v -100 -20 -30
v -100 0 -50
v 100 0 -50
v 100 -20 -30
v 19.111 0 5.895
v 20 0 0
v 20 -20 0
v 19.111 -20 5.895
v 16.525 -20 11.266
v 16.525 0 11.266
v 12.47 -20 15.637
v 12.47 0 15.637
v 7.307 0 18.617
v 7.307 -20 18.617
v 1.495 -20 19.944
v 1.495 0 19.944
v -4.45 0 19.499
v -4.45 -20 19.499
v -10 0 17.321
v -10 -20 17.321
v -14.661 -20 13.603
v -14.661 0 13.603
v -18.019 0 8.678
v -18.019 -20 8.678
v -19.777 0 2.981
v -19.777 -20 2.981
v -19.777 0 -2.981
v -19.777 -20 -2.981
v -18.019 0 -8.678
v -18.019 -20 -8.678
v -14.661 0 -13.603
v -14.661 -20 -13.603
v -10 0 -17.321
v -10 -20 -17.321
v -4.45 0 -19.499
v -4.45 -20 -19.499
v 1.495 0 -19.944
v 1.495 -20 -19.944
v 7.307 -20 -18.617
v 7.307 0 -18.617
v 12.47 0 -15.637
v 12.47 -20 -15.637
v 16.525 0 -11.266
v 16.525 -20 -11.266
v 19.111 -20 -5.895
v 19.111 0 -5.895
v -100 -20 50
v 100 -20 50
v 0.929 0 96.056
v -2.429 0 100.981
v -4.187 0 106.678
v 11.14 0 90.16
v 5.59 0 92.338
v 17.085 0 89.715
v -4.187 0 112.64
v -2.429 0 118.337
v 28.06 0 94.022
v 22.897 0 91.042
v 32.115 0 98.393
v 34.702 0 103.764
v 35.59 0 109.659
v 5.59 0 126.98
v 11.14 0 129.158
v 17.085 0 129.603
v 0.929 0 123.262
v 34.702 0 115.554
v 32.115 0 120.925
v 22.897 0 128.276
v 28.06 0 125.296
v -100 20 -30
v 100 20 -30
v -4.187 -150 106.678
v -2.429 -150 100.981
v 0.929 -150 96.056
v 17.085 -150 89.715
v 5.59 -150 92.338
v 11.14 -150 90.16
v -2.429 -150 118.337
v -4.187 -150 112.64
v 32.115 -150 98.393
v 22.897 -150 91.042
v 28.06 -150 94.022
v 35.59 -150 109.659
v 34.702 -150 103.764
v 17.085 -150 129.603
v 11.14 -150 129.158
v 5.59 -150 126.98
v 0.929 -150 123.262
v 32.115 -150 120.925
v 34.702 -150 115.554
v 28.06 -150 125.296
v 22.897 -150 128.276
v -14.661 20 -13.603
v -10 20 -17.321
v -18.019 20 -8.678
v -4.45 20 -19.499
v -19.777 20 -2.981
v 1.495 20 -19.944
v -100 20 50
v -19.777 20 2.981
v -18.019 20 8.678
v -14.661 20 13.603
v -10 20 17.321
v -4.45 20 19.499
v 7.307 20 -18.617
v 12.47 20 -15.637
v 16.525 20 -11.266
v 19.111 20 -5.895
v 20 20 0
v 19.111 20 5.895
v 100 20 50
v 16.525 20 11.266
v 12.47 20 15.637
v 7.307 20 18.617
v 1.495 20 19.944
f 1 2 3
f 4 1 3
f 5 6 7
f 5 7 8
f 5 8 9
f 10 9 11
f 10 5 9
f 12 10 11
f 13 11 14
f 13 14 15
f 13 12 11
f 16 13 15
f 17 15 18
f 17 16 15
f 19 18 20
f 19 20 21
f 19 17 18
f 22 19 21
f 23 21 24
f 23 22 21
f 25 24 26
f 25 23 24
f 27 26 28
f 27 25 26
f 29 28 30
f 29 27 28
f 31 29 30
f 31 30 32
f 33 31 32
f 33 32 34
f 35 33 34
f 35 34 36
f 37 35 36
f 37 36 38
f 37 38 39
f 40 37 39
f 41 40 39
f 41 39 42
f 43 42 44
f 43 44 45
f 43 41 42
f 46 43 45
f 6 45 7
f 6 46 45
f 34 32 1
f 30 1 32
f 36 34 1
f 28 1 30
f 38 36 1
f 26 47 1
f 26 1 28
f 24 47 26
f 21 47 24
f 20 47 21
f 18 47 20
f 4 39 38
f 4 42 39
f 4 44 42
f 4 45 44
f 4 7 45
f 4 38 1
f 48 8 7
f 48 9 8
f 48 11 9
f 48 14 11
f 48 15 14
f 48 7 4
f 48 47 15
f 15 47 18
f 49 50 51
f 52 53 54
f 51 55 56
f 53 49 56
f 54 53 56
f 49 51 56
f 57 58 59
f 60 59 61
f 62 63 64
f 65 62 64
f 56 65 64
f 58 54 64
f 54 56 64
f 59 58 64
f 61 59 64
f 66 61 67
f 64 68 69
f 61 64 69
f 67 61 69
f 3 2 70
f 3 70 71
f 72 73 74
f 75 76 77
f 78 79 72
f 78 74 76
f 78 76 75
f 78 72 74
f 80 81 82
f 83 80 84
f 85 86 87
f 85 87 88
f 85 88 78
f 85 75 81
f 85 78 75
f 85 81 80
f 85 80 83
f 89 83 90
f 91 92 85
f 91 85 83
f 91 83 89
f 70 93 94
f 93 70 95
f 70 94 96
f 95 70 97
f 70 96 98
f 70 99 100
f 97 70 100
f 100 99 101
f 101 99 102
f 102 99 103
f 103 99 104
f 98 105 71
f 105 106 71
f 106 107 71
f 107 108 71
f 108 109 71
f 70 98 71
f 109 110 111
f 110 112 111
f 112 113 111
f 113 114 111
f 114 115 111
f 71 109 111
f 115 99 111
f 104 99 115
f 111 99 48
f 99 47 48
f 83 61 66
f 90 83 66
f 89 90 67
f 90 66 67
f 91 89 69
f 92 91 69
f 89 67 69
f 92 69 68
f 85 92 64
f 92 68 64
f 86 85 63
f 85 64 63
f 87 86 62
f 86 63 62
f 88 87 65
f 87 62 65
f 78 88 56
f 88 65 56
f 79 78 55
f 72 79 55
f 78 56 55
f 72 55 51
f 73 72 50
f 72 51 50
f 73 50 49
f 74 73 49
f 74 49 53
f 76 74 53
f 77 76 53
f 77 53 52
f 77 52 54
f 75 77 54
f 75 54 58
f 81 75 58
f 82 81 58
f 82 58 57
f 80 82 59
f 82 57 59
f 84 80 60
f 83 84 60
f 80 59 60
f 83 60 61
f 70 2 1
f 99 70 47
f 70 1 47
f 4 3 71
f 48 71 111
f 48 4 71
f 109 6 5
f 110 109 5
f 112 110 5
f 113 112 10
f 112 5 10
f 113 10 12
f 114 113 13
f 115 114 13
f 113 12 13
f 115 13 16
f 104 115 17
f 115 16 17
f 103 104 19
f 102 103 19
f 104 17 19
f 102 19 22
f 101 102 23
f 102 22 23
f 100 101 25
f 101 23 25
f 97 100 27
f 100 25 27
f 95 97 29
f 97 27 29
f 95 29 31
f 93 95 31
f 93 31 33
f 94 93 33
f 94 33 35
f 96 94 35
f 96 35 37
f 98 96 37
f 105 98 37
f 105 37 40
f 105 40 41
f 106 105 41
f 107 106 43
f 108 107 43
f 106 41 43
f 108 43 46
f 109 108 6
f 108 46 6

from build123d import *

# Parameters (mm, degrees)
F0_W          = 200
F0_H          = 100
F0_R          = 20
F1_DEPTH      = 20
F1_DEPTH_BACK = 20
F2_SIZE       = 19.99999
F3_R          = 20
F4_DEPTH      = 150


# Not quite as in the source:
# - a fillet or chamfer is up to 0.001 mm smaller than in the source, because OpenCascade refuses the exact size


with BuildPart() as f1:
    # F0 (on Front) → F1 (new body, two sides)
    with BuildSketch(Plane.XZ) as f1_sk:
        Rectangle(F0_W, F0_H)
        Circle(F0_R, mode=Mode.SUBTRACT)
    extrude(amount=F1_DEPTH)
    extrude(f1_sk.sketch, amount=-F1_DEPTH_BACK)

    # F2 (size 20 in the source; OpenCascade refuses exactly that, so slightly less here)
    f2_edges = [f1.edges().sort_by_distance(p)[0] for p in [
        (0, 20, -50),
        (0, -20, -50),
    ]]
    chamfer(f2_edges, length=F2_SIZE)


with BuildPart() as f4:
    # F3 (on Front) → F4 (new body)
    with BuildSketch(Plane.XZ):
        with Locations((15.5900605023, 109.6589937806)):
            Circle(F3_R)
    extrude(amount=F4_DEPTH)


solid = Compound([f1.part, f4.part])
